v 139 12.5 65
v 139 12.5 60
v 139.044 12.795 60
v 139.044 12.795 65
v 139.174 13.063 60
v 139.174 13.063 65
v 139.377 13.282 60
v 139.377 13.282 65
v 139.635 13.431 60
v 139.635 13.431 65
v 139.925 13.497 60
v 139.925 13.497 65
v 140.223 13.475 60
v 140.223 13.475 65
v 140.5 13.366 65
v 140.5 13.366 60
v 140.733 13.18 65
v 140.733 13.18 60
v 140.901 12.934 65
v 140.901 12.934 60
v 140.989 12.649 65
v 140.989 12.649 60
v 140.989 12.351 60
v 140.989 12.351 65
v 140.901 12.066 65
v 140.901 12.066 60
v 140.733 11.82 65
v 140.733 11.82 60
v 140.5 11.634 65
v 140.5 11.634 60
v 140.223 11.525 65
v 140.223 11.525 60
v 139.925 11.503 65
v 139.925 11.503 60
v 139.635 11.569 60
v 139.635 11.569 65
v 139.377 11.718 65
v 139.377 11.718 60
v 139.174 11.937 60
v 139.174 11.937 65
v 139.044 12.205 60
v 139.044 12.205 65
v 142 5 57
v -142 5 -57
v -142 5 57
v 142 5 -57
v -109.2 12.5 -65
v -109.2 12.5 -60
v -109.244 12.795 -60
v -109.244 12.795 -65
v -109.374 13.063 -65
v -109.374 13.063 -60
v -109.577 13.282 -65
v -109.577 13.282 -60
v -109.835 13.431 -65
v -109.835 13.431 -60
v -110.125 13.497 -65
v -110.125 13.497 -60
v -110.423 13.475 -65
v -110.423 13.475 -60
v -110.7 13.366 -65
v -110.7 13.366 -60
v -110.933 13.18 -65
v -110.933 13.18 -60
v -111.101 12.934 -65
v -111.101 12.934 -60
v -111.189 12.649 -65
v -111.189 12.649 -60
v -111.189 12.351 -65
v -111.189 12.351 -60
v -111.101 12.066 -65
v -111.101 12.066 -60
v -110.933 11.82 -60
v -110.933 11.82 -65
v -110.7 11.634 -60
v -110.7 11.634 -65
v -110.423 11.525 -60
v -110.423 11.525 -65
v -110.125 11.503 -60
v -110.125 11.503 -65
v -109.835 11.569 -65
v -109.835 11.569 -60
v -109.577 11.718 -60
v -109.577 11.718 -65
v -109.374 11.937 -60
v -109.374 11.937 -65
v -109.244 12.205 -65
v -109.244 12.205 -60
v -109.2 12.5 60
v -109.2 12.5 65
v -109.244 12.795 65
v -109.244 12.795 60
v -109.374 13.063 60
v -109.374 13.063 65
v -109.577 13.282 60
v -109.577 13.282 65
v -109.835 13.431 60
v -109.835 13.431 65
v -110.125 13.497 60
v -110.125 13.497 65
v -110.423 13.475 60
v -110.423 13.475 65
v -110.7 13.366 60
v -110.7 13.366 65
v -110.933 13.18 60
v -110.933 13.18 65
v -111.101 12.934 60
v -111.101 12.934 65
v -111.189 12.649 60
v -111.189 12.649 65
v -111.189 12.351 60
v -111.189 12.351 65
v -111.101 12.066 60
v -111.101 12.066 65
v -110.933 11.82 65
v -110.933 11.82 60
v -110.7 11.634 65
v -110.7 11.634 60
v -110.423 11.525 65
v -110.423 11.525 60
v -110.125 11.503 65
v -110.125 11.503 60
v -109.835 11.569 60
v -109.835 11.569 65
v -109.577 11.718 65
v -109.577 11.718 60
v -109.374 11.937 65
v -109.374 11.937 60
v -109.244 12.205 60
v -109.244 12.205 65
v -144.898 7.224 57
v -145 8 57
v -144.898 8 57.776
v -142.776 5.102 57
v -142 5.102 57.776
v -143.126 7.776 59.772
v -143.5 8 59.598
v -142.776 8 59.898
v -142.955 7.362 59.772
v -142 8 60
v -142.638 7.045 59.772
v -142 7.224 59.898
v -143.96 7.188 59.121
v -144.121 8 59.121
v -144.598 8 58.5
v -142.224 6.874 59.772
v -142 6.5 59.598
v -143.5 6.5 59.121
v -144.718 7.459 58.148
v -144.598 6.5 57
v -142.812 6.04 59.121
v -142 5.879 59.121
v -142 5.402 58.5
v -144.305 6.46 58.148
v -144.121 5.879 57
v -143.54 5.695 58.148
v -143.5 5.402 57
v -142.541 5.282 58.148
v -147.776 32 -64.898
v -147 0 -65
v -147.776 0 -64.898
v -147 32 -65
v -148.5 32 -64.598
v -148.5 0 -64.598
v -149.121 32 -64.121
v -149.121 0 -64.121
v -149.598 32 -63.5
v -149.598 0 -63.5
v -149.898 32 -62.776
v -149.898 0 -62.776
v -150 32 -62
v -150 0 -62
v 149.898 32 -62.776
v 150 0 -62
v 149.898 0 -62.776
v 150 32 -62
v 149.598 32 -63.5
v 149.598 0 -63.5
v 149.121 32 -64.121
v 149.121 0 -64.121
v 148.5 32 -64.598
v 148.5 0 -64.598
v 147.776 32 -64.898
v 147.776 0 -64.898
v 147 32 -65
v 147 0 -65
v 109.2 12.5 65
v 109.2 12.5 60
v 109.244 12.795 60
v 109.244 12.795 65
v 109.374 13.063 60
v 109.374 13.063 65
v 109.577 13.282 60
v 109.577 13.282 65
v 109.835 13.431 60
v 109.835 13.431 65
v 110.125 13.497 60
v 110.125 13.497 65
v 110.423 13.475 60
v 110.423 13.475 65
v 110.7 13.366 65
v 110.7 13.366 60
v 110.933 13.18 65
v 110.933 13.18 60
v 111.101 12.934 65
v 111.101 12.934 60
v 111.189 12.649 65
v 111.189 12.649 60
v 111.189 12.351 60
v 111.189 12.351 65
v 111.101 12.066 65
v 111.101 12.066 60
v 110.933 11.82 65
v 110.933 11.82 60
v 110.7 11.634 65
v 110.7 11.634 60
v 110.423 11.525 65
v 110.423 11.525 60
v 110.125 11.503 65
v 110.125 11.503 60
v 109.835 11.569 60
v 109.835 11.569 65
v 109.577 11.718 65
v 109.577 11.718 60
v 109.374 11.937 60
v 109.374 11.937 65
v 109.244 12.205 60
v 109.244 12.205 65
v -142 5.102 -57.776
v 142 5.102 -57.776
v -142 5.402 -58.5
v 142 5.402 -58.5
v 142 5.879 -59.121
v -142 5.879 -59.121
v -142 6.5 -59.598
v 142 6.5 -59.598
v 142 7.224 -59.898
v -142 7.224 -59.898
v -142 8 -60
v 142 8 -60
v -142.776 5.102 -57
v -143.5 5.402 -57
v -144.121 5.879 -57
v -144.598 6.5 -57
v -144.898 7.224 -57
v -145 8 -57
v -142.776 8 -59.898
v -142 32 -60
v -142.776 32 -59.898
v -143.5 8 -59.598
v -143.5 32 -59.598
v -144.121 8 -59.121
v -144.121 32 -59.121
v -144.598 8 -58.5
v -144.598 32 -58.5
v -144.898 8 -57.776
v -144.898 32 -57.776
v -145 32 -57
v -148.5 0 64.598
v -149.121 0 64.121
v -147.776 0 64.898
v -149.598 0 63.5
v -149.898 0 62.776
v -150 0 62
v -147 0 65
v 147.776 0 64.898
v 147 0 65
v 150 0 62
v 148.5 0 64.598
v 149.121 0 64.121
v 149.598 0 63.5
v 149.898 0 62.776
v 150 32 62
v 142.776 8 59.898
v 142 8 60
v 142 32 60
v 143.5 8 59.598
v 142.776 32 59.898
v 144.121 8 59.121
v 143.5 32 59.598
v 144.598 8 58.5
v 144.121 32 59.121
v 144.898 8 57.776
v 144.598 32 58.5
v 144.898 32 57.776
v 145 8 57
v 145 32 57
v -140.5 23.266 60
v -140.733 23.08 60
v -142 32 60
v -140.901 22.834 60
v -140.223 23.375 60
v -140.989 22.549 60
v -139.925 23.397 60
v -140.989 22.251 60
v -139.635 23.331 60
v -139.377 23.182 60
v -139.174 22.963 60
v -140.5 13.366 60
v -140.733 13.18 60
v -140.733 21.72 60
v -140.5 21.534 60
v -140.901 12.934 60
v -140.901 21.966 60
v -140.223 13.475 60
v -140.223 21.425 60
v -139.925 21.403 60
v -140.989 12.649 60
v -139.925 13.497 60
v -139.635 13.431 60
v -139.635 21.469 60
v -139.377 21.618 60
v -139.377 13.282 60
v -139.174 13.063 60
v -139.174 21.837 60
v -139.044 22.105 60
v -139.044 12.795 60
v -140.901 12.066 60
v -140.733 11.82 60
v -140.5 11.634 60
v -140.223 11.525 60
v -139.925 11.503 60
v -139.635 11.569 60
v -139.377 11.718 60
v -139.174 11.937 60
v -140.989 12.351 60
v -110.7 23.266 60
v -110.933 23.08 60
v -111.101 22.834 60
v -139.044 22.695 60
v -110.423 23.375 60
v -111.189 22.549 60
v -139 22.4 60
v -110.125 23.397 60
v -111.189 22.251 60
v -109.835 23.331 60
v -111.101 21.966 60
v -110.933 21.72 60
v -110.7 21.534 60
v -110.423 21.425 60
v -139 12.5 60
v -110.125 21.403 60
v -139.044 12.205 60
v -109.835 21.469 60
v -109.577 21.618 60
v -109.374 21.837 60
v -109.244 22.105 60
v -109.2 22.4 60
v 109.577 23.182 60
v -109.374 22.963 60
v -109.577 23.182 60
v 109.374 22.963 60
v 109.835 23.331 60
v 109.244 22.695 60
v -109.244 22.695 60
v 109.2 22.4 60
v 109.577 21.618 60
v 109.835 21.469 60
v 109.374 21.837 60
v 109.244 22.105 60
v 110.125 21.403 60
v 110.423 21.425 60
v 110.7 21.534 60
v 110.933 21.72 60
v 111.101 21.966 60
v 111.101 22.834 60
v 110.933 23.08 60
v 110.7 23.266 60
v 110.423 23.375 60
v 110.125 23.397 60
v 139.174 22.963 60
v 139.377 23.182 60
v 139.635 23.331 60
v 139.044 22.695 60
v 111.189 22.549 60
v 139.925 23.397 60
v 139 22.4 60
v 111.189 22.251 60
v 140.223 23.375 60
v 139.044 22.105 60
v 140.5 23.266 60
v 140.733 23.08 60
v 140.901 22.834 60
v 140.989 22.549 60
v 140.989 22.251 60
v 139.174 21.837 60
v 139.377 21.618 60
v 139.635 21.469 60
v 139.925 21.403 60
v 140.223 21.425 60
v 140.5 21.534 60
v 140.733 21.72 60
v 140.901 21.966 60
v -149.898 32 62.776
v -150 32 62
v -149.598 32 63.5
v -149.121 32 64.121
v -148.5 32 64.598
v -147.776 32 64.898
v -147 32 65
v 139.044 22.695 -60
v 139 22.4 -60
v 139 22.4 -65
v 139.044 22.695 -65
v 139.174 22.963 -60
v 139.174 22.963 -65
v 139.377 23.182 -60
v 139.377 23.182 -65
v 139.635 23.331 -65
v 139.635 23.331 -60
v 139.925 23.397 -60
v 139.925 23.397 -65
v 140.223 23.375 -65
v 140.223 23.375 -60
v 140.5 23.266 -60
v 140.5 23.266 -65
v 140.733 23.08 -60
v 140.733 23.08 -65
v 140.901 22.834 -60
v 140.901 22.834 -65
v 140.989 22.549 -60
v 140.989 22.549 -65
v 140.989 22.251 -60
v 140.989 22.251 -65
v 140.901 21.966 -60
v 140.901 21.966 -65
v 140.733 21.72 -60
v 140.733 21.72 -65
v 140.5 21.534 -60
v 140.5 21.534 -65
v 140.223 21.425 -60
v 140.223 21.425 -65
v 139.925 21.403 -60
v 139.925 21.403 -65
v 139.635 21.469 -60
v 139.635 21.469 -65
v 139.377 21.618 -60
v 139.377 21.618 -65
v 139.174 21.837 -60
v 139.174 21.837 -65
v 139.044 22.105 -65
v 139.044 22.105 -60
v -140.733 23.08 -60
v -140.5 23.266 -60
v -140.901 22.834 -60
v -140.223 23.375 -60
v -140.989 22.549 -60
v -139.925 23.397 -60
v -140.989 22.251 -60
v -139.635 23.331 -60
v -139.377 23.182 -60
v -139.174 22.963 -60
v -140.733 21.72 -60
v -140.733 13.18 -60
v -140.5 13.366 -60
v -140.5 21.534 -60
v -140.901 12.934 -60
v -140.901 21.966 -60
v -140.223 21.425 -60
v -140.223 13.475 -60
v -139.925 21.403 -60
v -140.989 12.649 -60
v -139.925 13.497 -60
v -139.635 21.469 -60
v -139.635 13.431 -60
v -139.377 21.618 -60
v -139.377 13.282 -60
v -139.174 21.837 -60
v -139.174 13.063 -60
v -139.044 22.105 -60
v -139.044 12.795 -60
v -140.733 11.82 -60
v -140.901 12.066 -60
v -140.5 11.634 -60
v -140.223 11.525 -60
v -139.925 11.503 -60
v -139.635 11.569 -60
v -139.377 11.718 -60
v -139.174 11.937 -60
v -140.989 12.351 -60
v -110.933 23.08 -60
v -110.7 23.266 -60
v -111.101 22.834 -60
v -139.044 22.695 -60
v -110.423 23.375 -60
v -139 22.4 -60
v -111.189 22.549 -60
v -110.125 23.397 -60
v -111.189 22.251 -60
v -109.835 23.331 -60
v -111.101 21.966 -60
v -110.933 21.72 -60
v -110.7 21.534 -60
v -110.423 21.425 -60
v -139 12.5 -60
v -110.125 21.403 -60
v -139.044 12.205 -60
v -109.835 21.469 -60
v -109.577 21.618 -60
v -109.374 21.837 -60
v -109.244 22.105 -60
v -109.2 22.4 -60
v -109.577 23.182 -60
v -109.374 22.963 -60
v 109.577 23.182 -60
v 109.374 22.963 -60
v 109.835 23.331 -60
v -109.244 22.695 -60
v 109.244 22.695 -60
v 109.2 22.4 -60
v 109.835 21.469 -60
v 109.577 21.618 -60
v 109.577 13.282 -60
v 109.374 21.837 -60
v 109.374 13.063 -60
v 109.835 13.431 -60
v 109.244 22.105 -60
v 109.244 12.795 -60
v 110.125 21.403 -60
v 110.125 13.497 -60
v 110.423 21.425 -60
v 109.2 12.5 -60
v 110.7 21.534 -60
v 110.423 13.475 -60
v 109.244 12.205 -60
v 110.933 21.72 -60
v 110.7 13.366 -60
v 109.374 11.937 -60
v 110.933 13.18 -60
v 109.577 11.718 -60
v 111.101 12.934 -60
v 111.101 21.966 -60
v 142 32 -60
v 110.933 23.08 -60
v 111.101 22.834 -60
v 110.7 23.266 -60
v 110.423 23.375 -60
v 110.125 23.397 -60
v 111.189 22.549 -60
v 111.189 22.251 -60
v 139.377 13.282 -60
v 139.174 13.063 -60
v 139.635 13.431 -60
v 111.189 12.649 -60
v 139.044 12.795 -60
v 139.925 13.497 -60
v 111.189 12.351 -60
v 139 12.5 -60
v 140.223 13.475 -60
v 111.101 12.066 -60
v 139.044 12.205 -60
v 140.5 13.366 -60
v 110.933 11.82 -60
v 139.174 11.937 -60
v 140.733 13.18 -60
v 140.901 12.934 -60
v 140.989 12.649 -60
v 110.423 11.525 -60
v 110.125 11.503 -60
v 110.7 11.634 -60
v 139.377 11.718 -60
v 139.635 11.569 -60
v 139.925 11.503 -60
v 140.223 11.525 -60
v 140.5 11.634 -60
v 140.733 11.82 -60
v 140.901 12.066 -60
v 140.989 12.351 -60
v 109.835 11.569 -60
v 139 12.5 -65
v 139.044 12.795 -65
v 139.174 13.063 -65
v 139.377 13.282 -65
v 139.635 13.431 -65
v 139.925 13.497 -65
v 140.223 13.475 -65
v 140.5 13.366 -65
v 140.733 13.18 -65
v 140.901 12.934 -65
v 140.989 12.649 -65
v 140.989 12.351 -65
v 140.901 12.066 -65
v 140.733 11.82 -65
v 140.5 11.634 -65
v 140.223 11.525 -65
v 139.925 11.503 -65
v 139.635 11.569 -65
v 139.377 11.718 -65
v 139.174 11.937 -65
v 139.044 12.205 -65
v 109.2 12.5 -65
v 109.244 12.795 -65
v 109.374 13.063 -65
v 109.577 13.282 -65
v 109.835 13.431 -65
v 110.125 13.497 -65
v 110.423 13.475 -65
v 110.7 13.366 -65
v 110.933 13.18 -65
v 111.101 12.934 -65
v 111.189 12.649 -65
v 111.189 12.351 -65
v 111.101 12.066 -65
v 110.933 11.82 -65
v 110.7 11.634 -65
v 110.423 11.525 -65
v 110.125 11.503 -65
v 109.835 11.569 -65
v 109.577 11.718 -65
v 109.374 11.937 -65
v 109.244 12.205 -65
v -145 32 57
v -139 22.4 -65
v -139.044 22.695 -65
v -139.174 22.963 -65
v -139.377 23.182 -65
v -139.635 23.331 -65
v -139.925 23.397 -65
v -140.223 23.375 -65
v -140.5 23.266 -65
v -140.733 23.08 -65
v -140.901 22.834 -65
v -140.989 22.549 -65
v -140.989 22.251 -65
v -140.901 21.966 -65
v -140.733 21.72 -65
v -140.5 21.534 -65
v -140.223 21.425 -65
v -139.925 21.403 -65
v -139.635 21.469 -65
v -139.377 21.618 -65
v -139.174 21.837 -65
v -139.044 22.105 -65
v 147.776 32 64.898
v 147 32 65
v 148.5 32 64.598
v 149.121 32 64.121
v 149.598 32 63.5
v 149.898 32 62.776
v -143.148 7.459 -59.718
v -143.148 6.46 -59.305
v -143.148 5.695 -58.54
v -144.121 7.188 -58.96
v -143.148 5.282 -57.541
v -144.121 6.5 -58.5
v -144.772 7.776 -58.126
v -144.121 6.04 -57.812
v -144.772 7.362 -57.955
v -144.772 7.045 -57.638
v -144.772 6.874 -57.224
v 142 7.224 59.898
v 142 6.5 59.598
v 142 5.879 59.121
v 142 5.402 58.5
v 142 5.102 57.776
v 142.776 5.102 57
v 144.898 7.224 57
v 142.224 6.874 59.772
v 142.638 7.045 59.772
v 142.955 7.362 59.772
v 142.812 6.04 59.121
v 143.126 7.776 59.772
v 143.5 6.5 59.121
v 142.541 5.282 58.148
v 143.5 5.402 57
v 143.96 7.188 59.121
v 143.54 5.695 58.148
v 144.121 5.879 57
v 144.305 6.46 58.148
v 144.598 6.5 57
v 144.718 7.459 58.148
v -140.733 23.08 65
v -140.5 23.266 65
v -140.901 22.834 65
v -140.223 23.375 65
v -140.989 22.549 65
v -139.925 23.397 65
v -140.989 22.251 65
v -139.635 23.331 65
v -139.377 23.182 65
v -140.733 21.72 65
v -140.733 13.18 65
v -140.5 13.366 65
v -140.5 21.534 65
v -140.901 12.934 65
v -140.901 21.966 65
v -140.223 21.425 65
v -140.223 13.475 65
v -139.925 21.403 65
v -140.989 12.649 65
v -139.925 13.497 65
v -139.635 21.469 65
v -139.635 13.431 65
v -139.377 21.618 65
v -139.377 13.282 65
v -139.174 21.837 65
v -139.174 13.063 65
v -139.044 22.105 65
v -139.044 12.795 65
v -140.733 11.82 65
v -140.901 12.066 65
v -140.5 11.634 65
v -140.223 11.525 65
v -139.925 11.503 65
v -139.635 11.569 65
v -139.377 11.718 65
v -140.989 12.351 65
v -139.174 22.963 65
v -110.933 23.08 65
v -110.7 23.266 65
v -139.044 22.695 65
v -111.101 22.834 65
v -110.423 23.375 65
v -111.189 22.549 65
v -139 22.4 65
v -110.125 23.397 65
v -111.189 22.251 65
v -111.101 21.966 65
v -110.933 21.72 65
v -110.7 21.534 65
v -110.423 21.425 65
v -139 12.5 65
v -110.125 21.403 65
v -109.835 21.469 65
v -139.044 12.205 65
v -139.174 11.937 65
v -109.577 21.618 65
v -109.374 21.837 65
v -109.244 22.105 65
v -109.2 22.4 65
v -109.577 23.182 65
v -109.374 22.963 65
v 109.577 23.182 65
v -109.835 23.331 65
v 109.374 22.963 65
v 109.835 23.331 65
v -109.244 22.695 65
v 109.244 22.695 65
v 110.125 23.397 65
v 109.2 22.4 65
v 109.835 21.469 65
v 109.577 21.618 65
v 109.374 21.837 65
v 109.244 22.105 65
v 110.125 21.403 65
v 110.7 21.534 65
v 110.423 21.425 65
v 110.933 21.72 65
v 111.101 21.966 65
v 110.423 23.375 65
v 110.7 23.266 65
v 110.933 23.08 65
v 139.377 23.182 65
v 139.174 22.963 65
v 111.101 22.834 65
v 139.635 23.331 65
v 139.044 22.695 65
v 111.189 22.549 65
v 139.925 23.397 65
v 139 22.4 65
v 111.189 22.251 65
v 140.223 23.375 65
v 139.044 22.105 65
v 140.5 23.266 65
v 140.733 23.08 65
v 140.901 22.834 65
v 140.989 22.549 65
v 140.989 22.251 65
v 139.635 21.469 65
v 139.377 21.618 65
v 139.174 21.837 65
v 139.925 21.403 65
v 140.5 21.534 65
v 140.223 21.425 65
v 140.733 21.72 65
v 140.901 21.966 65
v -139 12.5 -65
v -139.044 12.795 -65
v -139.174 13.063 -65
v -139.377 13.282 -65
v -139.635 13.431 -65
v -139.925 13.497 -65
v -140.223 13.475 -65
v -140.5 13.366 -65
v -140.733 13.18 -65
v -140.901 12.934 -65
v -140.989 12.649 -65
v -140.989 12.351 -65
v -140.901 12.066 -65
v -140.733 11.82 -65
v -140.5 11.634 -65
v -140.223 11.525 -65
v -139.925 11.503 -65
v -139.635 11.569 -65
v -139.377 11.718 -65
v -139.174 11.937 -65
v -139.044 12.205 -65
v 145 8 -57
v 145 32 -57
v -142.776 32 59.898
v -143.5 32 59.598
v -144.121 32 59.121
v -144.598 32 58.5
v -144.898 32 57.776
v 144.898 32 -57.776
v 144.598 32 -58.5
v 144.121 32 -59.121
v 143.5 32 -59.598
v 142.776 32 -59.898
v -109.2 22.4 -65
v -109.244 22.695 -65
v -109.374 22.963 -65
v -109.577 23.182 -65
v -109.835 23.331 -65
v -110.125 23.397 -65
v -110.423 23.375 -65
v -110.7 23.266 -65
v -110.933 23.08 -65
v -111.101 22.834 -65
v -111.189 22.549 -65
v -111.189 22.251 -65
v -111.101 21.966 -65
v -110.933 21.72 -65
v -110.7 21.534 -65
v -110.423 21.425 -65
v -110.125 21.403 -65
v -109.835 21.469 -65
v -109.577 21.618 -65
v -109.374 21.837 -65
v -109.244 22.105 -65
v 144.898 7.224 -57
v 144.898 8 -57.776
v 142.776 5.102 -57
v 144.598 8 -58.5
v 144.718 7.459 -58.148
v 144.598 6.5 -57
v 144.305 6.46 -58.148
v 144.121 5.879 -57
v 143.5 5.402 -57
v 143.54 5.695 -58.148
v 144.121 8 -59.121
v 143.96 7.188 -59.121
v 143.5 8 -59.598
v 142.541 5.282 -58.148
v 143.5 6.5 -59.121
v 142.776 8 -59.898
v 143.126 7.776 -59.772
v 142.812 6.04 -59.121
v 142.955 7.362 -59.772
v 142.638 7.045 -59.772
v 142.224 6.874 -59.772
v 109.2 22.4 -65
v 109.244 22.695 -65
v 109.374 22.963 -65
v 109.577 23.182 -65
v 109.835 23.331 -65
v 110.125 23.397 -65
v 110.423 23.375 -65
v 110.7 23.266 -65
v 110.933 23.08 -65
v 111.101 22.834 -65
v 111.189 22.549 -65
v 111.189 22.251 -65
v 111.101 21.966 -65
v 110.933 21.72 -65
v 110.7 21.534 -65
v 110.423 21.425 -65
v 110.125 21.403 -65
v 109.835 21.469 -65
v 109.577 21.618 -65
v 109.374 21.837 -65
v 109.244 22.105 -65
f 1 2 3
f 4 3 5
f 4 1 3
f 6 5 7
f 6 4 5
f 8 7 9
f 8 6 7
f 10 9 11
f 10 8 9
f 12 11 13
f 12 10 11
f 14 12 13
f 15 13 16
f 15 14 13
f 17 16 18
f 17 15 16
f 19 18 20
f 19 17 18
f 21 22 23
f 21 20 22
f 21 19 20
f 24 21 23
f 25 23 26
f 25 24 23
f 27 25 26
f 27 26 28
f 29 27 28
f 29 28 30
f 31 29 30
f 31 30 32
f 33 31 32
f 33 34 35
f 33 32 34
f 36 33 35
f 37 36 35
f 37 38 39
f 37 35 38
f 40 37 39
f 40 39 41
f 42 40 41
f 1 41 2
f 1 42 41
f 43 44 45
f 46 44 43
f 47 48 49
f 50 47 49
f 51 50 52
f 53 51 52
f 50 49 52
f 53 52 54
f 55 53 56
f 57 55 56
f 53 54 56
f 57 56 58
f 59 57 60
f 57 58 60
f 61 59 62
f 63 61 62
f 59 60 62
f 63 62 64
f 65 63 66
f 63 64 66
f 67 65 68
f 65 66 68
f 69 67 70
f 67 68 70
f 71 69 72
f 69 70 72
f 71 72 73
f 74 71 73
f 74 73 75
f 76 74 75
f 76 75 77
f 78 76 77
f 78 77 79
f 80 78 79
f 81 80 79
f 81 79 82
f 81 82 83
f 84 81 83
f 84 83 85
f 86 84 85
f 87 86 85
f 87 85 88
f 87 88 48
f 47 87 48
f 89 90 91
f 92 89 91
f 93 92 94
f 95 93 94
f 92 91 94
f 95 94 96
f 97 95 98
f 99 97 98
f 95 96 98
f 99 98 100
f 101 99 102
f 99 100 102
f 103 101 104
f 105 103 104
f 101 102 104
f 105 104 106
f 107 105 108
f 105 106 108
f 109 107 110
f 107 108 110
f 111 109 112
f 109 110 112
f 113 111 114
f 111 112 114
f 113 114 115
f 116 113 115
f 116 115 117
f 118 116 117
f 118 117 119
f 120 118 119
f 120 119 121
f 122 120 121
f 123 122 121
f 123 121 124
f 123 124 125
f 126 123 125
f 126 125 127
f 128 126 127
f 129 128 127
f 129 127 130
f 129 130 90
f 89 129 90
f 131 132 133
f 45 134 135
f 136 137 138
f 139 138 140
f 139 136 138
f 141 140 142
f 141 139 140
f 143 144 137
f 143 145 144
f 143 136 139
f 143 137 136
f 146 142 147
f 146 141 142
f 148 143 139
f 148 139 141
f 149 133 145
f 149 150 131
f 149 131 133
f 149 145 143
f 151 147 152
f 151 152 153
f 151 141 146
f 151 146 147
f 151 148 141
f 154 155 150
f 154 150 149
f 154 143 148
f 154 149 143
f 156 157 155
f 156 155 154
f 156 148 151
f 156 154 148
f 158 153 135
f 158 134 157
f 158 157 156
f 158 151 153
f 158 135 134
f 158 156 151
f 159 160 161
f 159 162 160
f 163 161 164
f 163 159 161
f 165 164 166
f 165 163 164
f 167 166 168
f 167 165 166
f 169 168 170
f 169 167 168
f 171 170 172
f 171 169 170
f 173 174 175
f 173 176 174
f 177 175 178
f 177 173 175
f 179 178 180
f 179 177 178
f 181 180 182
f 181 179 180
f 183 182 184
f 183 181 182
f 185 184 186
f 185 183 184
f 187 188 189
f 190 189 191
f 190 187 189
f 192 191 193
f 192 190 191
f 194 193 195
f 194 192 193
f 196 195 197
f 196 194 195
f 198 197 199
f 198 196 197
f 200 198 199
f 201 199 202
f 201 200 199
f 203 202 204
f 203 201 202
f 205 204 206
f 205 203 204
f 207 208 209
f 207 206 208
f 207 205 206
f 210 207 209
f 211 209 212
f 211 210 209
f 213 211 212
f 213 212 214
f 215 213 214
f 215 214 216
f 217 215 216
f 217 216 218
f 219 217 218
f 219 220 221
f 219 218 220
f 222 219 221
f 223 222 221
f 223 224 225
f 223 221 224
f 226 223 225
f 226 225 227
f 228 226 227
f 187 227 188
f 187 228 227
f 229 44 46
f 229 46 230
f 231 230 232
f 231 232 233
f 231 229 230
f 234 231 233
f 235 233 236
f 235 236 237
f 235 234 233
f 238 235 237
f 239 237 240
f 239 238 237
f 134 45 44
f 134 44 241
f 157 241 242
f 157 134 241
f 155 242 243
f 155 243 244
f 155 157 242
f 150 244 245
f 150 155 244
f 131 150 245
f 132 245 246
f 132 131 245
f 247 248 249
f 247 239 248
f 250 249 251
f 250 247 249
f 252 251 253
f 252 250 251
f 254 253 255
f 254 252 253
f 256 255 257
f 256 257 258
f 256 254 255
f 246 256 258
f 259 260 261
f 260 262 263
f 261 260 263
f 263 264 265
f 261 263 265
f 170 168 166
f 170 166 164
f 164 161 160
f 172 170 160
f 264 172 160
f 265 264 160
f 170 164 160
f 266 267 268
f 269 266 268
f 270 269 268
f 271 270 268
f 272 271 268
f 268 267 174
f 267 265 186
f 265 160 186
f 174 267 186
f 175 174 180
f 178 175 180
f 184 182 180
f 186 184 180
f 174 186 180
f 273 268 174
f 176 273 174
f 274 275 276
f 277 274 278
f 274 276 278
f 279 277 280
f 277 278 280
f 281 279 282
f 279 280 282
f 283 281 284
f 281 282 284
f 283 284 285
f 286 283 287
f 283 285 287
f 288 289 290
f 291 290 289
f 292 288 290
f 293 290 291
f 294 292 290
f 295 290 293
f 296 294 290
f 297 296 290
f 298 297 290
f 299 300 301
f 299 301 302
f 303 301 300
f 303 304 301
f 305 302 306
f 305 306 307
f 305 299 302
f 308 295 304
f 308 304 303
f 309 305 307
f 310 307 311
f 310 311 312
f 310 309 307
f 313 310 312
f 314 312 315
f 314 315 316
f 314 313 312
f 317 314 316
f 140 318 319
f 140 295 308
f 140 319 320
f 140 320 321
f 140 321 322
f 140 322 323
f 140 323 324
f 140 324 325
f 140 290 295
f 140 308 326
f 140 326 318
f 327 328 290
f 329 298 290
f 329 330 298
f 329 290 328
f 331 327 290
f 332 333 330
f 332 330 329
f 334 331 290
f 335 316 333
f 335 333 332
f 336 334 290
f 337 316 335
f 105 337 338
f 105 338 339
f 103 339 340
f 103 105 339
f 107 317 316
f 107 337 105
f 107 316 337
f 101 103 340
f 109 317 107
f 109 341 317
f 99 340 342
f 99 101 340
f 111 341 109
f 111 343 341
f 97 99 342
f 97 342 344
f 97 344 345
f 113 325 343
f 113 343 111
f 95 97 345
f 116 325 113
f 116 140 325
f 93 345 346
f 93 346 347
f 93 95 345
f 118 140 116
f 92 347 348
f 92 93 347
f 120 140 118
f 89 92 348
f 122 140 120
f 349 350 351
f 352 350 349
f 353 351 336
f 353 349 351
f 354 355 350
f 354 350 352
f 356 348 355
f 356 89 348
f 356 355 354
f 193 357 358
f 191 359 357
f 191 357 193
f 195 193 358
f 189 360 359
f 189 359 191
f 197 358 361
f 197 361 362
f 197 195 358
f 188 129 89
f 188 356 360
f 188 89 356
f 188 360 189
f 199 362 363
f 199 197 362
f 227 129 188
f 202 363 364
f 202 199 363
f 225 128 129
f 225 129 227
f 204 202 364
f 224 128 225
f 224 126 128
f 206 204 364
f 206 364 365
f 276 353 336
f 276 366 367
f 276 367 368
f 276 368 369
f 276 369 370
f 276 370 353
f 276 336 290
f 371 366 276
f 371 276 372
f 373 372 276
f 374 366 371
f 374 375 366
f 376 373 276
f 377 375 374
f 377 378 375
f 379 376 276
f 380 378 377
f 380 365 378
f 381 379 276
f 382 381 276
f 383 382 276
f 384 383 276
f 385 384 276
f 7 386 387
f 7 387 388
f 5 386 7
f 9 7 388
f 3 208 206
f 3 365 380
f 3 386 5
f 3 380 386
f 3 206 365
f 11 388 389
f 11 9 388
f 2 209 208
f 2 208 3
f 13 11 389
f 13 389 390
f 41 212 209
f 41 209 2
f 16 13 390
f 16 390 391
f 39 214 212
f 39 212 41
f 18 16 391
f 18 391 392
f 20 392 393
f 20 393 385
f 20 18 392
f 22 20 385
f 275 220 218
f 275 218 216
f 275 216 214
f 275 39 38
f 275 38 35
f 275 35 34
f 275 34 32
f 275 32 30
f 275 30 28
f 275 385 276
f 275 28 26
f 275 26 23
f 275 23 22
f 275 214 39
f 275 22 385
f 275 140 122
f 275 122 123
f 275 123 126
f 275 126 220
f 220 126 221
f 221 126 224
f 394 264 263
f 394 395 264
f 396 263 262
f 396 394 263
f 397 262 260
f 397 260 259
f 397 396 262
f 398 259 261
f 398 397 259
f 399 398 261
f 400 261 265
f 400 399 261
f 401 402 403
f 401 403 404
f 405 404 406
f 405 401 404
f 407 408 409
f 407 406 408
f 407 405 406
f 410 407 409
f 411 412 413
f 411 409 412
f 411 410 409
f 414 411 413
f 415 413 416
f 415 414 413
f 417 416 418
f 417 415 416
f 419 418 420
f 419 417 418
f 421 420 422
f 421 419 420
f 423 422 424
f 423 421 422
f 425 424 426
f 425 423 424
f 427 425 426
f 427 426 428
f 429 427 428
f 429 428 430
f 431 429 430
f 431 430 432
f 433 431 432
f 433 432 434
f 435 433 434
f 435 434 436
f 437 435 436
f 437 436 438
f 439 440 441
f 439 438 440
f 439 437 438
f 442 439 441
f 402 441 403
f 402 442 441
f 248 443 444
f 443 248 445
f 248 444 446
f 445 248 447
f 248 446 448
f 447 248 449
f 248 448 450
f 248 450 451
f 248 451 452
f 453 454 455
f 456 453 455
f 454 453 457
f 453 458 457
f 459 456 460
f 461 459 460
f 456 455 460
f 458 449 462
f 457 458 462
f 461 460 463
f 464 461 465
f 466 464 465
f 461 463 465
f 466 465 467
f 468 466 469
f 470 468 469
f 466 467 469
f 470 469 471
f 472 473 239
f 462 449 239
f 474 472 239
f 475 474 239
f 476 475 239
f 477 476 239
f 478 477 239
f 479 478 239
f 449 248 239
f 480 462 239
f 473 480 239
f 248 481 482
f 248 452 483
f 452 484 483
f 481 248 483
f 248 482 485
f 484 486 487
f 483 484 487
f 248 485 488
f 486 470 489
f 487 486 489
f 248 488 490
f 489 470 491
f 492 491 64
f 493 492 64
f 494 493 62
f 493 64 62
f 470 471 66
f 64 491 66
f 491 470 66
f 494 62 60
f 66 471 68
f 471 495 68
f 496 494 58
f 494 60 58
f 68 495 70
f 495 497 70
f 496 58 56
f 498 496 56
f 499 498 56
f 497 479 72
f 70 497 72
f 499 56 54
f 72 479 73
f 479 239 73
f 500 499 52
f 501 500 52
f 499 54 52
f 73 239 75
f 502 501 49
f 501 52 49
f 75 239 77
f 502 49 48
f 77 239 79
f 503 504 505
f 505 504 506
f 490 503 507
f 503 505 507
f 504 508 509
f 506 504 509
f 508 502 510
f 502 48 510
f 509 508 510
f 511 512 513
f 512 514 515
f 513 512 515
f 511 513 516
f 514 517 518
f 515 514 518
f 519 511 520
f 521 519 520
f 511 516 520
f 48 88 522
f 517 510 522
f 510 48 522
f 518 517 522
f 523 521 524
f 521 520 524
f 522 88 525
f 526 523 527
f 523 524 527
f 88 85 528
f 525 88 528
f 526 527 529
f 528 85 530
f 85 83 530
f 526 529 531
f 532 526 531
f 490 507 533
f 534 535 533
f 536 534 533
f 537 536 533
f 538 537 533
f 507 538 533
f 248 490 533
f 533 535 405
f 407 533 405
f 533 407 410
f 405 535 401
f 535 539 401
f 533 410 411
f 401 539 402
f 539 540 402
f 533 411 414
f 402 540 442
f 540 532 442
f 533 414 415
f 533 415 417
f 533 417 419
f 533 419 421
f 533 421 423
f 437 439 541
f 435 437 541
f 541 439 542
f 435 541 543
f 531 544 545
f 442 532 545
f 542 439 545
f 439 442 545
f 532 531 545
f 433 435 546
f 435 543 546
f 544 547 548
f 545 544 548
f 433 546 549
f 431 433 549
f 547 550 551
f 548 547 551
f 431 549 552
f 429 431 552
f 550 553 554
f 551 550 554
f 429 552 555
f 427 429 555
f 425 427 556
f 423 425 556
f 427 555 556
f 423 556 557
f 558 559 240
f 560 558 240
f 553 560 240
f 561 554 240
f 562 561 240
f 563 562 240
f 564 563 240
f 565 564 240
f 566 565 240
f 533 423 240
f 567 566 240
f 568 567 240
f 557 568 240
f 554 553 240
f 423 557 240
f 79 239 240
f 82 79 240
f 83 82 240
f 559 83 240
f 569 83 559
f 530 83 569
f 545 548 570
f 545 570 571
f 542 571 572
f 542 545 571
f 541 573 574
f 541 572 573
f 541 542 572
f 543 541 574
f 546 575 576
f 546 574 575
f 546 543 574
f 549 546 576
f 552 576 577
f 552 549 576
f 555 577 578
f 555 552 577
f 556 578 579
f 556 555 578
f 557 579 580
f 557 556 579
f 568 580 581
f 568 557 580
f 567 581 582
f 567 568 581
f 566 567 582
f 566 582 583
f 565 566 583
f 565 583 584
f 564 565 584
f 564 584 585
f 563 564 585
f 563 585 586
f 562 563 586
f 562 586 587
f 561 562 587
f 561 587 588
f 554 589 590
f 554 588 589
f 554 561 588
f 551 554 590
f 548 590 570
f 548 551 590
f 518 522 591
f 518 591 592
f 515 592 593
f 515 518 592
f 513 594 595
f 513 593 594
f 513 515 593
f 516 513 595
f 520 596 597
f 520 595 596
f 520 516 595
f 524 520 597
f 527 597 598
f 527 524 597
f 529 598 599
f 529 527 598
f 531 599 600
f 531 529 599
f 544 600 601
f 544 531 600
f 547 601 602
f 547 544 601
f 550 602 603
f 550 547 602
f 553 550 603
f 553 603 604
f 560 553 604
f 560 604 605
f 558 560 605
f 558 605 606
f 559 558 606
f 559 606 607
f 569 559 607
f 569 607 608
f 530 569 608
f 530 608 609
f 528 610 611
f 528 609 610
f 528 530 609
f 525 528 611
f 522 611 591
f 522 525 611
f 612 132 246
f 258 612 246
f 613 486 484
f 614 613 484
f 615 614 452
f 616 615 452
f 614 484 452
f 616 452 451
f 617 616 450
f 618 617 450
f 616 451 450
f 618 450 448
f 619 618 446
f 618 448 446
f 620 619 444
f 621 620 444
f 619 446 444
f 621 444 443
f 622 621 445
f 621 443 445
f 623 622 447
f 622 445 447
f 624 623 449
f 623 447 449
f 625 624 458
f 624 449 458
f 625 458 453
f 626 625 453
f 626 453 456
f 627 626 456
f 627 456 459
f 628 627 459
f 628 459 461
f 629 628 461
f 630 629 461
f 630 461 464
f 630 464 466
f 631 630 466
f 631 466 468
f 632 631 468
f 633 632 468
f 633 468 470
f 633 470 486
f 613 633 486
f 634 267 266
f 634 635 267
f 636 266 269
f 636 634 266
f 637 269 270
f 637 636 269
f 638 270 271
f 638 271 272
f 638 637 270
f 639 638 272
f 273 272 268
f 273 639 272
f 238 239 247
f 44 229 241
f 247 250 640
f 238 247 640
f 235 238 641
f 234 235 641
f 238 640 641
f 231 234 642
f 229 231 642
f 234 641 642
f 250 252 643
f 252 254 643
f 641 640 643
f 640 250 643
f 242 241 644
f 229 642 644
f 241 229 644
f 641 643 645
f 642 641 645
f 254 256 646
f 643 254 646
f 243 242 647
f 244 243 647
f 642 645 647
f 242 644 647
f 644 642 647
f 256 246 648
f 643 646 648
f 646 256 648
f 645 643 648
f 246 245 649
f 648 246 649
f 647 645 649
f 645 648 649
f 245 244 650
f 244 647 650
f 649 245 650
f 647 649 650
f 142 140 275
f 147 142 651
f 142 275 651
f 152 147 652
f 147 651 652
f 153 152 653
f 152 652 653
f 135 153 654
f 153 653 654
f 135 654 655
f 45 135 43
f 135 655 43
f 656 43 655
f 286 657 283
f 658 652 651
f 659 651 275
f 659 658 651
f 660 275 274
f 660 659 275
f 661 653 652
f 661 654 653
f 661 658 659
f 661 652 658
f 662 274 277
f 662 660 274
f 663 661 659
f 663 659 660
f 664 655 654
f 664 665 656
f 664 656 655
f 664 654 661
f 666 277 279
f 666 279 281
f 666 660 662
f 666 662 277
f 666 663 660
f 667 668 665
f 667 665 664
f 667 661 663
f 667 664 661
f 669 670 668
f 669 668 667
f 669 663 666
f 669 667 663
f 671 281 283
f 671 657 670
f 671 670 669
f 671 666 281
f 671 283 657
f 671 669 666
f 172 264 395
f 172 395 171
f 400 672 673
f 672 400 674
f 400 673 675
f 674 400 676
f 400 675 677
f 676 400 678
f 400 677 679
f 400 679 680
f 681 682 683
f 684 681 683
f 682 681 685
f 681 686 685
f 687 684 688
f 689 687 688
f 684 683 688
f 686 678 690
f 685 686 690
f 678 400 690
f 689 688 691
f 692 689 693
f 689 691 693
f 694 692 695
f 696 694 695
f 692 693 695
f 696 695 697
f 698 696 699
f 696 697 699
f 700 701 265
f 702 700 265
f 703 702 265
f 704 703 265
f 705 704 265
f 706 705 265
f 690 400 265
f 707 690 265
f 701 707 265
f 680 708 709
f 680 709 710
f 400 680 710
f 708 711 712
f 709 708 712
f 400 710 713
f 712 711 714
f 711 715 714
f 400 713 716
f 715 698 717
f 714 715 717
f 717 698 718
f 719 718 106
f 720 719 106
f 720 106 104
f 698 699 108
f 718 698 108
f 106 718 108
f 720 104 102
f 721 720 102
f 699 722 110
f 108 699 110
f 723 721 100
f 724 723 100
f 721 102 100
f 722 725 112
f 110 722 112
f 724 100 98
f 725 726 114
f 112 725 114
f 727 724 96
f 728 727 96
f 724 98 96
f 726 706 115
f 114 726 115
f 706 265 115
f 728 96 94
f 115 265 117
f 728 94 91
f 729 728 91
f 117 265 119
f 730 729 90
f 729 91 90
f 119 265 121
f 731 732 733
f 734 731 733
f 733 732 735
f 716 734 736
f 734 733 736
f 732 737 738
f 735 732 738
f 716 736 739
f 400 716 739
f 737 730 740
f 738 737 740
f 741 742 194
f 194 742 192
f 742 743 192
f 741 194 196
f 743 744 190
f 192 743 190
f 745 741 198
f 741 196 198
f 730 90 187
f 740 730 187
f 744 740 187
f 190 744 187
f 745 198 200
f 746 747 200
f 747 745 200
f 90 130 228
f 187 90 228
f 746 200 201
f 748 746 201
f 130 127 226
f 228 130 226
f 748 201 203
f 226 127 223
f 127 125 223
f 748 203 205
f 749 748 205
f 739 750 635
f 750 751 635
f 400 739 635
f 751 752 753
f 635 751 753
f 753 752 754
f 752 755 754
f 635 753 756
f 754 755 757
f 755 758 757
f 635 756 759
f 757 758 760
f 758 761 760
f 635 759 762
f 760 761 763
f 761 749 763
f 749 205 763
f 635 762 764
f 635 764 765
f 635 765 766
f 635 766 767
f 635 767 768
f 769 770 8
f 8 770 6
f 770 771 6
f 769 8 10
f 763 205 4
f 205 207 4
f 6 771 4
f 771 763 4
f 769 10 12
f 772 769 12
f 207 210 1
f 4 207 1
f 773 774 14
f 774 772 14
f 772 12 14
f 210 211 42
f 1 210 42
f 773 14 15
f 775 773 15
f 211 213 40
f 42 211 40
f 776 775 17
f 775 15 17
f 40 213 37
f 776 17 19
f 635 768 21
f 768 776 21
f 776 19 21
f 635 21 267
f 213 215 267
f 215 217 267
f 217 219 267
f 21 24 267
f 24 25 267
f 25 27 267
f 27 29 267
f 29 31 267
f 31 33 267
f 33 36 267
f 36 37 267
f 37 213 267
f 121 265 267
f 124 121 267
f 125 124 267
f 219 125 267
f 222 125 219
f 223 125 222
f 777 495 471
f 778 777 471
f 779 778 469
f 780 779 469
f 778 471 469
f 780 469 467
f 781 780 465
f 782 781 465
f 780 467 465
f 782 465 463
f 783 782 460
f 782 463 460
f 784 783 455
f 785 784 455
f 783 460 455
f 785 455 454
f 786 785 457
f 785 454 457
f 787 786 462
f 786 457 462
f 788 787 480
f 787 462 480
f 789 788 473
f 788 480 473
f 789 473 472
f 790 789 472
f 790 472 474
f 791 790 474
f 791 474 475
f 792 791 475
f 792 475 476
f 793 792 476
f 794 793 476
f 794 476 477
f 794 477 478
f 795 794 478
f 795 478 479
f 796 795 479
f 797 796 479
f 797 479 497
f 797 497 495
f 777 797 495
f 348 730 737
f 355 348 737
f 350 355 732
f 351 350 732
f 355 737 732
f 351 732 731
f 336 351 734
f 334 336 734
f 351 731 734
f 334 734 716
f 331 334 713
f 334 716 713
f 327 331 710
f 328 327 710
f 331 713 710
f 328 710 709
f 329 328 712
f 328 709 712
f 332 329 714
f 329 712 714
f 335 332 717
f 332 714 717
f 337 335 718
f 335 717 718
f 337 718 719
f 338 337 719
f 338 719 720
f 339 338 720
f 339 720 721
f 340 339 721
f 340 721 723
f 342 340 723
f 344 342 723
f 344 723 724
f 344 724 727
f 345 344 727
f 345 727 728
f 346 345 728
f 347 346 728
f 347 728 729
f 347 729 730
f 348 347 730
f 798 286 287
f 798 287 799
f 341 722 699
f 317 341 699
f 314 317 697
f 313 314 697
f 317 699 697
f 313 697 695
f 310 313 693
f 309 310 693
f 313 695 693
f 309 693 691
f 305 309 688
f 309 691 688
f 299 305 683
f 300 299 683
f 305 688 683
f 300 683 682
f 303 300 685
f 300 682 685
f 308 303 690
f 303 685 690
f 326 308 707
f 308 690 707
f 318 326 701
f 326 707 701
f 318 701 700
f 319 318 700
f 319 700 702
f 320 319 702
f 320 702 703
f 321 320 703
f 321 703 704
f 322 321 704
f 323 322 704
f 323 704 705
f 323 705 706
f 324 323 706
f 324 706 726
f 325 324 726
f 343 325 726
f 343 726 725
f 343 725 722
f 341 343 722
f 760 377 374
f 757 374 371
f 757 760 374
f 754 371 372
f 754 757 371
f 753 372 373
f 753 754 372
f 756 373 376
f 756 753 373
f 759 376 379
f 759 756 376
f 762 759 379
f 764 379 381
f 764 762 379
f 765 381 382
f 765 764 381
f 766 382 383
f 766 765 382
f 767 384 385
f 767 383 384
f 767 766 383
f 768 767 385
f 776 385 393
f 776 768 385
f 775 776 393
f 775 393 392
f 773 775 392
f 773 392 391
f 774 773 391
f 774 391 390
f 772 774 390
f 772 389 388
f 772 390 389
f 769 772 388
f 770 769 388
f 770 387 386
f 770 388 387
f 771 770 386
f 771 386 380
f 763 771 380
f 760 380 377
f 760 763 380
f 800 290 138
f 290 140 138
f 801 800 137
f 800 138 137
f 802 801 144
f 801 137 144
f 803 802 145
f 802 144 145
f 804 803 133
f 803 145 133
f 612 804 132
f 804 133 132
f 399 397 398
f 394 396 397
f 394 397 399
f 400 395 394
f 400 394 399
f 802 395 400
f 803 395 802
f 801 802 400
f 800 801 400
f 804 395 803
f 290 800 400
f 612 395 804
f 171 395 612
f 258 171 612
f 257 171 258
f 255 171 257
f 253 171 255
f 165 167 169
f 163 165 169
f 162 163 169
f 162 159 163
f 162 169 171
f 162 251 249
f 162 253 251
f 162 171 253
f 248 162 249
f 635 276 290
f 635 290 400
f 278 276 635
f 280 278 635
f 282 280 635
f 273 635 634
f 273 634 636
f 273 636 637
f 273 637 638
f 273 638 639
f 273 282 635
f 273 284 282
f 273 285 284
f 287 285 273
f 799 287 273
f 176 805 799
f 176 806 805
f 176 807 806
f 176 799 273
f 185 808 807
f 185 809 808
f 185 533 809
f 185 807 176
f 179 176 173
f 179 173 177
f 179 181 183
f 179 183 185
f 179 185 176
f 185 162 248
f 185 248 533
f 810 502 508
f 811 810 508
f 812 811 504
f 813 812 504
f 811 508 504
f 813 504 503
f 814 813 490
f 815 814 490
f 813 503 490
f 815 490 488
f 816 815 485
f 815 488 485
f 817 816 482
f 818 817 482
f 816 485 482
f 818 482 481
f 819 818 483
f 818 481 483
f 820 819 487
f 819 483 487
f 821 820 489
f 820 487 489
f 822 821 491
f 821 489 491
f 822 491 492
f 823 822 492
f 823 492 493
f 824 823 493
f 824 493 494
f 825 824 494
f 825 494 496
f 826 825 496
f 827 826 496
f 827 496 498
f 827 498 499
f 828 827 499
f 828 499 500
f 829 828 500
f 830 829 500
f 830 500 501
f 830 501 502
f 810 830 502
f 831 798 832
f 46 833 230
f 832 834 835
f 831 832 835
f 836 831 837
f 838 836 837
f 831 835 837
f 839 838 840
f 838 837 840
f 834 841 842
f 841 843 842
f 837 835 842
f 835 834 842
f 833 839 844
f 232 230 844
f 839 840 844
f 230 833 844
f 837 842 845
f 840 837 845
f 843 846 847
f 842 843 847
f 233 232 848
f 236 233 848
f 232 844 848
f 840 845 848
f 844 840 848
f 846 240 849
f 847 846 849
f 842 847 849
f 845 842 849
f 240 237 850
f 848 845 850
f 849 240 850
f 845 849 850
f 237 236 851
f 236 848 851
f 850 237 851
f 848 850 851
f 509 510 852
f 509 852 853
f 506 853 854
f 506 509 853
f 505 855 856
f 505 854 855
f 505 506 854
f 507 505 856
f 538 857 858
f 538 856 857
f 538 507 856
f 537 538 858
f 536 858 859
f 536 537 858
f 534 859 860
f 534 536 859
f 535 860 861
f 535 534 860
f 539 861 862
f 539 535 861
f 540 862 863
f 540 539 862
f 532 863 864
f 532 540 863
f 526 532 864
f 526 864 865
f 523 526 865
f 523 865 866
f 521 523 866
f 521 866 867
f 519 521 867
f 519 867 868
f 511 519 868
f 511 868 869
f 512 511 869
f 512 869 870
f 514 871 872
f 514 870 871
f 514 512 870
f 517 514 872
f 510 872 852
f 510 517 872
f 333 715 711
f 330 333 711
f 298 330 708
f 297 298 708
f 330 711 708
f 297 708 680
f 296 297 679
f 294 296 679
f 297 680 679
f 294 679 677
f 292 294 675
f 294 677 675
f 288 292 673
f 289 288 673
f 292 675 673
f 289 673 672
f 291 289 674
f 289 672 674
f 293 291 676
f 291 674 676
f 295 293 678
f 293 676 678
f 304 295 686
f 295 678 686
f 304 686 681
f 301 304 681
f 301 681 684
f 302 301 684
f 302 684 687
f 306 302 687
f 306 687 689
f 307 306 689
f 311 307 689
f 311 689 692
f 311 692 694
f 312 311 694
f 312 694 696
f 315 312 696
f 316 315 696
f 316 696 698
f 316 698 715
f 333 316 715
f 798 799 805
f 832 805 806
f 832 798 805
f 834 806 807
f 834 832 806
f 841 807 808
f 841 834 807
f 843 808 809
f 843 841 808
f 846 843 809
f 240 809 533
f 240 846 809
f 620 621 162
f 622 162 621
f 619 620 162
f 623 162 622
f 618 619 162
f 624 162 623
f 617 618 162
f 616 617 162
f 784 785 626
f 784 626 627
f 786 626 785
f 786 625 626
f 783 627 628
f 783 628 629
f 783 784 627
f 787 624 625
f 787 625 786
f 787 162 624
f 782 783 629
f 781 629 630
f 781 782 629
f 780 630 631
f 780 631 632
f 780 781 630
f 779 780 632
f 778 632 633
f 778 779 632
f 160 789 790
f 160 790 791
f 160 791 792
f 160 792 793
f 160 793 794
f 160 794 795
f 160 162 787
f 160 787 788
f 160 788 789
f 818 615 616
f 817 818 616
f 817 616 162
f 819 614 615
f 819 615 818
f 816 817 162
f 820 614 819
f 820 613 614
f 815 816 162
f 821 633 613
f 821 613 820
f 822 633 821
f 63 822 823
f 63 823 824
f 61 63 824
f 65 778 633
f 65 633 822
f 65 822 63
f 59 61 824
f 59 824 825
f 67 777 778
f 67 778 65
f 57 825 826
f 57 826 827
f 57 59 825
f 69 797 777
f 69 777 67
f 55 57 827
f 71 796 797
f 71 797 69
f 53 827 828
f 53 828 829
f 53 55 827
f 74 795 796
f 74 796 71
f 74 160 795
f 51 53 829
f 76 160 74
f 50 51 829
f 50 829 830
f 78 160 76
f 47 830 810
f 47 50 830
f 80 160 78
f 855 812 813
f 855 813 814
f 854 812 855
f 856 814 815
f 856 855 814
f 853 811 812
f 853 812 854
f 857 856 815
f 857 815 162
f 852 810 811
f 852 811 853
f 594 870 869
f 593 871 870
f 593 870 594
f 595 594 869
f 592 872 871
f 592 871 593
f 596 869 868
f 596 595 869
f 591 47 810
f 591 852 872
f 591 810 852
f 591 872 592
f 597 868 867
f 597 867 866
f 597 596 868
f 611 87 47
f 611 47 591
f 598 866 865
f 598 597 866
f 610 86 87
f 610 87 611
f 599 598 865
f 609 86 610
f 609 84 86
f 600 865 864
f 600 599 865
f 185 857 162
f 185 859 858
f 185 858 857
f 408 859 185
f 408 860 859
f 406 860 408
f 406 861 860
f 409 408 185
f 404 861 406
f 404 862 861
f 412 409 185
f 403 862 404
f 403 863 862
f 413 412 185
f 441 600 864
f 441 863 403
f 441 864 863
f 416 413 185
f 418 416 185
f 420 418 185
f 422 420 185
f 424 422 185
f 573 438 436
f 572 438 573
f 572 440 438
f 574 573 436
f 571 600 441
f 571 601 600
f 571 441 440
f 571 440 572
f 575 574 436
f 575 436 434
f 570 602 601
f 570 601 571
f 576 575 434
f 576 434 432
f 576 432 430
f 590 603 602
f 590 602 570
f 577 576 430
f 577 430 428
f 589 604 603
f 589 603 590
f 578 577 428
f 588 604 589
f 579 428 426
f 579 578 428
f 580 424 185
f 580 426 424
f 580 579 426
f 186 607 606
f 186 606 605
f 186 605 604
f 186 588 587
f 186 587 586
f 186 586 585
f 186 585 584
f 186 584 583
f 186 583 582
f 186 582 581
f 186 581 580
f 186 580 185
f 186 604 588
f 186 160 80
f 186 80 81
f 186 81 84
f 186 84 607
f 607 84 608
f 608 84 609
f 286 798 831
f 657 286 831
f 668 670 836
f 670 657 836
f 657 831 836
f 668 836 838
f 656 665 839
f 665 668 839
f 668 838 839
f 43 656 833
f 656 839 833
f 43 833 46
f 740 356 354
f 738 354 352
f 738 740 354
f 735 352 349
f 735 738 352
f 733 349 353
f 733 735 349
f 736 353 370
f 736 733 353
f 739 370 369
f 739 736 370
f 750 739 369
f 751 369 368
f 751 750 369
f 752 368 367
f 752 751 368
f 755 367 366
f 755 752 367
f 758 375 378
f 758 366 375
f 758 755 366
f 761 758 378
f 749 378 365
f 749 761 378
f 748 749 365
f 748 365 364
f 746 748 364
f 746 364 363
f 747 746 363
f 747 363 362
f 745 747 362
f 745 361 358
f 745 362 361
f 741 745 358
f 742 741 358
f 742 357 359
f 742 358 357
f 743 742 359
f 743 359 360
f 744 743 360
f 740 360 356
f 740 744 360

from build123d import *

# Parameters (mm, degrees)
SKETCH1_W           = 300
SKETCH1_H           = 130
BOSS_EXTRUDE1_DEPTH = 32
SHELL1_T            = -5
SKETCH3_R           = 1
CUT_EXTRUDE1_DEPTH  = 202.05720579
FILLET1_R           = 3
FILLET2_R           = 3
FILLET3_R           = 3
FILLET4_R           = 3
FILLET5_R           = 3
FILLET6_R           = 3
FILLET7_R           = 3
FILLET8_R           = 3


with BuildPart() as part:
    # Sketch1 → Boss-Extrude1 (new body)
    with BuildSketch(Plane(origin=(0, 0, 0), x_dir=(1, 0, 0), z_dir=(0, 1, 0))):
        Rectangle(SKETCH1_W, SKETCH1_H)
    extrude(amount=BOSS_EXTRUDE1_DEPTH)

    # Shell1
    shell1_openings = [part.faces().sort_by_distance(p)[0] for p in [
        (0, 32, 0),
    ]]
    offset(amount=SHELL1_T, openings=shell1_openings, kind=Kind.INTERSECTION)

    # Sketch3 → Cut-Extrude1 (cut, through all)
    with BuildSketch(Plane.XY.offset(65)):
        with Locations((-140, 22.4)):
            Circle(SKETCH3_R)
        with Locations((-110.2, 22.4)):
            Circle(SKETCH3_R)
        with Locations((-140, 12.5)):
            Circle(SKETCH3_R)
        with Locations((-110.2, 12.5)):
            Circle(SKETCH3_R)
    cut_extrude1 = extrude(amount=-CUT_EXTRUDE1_DEPTH, mode=Mode.SUBTRACT)

    # Mirror1: Cut-Extrude1 across plane
    add(cut_extrude1.mirror(Plane(origin=(0, 0, 0), x_dir=(0, 0, 1), z_dir=(1, 0, 0))), mode=Mode.SUBTRACT)

    # Fillet1
    fillet1_edges = [part.edges().sort_by_distance(p)[0] for p in [
        (145, 5, 0),
    ]]
    fillet(fillet1_edges, radius=FILLET1_R)

    # Fillet2
    fillet2_edges = [part.edges().sort_by_distance(p)[0] for p in [
        (145, 20, -60),
        (-1.5, 5, -60),
        (144.121320344, 5.878679656, -60),
    ]]
    fillet(fillet2_edges, radius=FILLET2_R)

    # Fillet3
    fillet3_edges = [part.edges().sort_by_distance(p)[0] for p in [
        (-145, 20, -60),
        (-145, 5, 1.5),
        (-145, 5.878679656, -59.121320344),
    ]]
    fillet(fillet3_edges, radius=FILLET3_R)

    # Fillet4
    fillet4_edges = [part.edges().sort_by_distance(p)[0] for p in [
        (0, 5, 60),
        (-144.121320344, 5.878679656, 60),
        (145, 20, 60),
        (-145, 20, 60),
        (144.121320344, 5.878679656, 60),
    ]]
    fillet(fillet4_edges, radius=FILLET4_R)

    # Fillet5
    fillet5_edges = [part.edges().sort_by_distance(p)[0] for p in [
        (150, 16, -65),
    ]]
    fillet(fillet5_edges, radius=FILLET5_R)

    # Fillet6
    fillet6_edges = [part.edges().sort_by_distance(p)[0] for p in [
        (-150, 16, -65),
    ]]
    fillet(fillet6_edges, radius=FILLET6_R)

    # Fillet7
    fillet7_edges = [part.edges().sort_by_distance(p)[0] for p in [
        (-150, 16, 65),
    ]]
    fillet(fillet7_edges, radius=FILLET7_R)

    # Fillet8
    fillet8_edges = [part.edges().sort_by_distance(p)[0] for p in [
        (150, 16, 65),
    ]]
    fillet(fillet8_edges, radius=FILLET8_R)


solid = part.part
